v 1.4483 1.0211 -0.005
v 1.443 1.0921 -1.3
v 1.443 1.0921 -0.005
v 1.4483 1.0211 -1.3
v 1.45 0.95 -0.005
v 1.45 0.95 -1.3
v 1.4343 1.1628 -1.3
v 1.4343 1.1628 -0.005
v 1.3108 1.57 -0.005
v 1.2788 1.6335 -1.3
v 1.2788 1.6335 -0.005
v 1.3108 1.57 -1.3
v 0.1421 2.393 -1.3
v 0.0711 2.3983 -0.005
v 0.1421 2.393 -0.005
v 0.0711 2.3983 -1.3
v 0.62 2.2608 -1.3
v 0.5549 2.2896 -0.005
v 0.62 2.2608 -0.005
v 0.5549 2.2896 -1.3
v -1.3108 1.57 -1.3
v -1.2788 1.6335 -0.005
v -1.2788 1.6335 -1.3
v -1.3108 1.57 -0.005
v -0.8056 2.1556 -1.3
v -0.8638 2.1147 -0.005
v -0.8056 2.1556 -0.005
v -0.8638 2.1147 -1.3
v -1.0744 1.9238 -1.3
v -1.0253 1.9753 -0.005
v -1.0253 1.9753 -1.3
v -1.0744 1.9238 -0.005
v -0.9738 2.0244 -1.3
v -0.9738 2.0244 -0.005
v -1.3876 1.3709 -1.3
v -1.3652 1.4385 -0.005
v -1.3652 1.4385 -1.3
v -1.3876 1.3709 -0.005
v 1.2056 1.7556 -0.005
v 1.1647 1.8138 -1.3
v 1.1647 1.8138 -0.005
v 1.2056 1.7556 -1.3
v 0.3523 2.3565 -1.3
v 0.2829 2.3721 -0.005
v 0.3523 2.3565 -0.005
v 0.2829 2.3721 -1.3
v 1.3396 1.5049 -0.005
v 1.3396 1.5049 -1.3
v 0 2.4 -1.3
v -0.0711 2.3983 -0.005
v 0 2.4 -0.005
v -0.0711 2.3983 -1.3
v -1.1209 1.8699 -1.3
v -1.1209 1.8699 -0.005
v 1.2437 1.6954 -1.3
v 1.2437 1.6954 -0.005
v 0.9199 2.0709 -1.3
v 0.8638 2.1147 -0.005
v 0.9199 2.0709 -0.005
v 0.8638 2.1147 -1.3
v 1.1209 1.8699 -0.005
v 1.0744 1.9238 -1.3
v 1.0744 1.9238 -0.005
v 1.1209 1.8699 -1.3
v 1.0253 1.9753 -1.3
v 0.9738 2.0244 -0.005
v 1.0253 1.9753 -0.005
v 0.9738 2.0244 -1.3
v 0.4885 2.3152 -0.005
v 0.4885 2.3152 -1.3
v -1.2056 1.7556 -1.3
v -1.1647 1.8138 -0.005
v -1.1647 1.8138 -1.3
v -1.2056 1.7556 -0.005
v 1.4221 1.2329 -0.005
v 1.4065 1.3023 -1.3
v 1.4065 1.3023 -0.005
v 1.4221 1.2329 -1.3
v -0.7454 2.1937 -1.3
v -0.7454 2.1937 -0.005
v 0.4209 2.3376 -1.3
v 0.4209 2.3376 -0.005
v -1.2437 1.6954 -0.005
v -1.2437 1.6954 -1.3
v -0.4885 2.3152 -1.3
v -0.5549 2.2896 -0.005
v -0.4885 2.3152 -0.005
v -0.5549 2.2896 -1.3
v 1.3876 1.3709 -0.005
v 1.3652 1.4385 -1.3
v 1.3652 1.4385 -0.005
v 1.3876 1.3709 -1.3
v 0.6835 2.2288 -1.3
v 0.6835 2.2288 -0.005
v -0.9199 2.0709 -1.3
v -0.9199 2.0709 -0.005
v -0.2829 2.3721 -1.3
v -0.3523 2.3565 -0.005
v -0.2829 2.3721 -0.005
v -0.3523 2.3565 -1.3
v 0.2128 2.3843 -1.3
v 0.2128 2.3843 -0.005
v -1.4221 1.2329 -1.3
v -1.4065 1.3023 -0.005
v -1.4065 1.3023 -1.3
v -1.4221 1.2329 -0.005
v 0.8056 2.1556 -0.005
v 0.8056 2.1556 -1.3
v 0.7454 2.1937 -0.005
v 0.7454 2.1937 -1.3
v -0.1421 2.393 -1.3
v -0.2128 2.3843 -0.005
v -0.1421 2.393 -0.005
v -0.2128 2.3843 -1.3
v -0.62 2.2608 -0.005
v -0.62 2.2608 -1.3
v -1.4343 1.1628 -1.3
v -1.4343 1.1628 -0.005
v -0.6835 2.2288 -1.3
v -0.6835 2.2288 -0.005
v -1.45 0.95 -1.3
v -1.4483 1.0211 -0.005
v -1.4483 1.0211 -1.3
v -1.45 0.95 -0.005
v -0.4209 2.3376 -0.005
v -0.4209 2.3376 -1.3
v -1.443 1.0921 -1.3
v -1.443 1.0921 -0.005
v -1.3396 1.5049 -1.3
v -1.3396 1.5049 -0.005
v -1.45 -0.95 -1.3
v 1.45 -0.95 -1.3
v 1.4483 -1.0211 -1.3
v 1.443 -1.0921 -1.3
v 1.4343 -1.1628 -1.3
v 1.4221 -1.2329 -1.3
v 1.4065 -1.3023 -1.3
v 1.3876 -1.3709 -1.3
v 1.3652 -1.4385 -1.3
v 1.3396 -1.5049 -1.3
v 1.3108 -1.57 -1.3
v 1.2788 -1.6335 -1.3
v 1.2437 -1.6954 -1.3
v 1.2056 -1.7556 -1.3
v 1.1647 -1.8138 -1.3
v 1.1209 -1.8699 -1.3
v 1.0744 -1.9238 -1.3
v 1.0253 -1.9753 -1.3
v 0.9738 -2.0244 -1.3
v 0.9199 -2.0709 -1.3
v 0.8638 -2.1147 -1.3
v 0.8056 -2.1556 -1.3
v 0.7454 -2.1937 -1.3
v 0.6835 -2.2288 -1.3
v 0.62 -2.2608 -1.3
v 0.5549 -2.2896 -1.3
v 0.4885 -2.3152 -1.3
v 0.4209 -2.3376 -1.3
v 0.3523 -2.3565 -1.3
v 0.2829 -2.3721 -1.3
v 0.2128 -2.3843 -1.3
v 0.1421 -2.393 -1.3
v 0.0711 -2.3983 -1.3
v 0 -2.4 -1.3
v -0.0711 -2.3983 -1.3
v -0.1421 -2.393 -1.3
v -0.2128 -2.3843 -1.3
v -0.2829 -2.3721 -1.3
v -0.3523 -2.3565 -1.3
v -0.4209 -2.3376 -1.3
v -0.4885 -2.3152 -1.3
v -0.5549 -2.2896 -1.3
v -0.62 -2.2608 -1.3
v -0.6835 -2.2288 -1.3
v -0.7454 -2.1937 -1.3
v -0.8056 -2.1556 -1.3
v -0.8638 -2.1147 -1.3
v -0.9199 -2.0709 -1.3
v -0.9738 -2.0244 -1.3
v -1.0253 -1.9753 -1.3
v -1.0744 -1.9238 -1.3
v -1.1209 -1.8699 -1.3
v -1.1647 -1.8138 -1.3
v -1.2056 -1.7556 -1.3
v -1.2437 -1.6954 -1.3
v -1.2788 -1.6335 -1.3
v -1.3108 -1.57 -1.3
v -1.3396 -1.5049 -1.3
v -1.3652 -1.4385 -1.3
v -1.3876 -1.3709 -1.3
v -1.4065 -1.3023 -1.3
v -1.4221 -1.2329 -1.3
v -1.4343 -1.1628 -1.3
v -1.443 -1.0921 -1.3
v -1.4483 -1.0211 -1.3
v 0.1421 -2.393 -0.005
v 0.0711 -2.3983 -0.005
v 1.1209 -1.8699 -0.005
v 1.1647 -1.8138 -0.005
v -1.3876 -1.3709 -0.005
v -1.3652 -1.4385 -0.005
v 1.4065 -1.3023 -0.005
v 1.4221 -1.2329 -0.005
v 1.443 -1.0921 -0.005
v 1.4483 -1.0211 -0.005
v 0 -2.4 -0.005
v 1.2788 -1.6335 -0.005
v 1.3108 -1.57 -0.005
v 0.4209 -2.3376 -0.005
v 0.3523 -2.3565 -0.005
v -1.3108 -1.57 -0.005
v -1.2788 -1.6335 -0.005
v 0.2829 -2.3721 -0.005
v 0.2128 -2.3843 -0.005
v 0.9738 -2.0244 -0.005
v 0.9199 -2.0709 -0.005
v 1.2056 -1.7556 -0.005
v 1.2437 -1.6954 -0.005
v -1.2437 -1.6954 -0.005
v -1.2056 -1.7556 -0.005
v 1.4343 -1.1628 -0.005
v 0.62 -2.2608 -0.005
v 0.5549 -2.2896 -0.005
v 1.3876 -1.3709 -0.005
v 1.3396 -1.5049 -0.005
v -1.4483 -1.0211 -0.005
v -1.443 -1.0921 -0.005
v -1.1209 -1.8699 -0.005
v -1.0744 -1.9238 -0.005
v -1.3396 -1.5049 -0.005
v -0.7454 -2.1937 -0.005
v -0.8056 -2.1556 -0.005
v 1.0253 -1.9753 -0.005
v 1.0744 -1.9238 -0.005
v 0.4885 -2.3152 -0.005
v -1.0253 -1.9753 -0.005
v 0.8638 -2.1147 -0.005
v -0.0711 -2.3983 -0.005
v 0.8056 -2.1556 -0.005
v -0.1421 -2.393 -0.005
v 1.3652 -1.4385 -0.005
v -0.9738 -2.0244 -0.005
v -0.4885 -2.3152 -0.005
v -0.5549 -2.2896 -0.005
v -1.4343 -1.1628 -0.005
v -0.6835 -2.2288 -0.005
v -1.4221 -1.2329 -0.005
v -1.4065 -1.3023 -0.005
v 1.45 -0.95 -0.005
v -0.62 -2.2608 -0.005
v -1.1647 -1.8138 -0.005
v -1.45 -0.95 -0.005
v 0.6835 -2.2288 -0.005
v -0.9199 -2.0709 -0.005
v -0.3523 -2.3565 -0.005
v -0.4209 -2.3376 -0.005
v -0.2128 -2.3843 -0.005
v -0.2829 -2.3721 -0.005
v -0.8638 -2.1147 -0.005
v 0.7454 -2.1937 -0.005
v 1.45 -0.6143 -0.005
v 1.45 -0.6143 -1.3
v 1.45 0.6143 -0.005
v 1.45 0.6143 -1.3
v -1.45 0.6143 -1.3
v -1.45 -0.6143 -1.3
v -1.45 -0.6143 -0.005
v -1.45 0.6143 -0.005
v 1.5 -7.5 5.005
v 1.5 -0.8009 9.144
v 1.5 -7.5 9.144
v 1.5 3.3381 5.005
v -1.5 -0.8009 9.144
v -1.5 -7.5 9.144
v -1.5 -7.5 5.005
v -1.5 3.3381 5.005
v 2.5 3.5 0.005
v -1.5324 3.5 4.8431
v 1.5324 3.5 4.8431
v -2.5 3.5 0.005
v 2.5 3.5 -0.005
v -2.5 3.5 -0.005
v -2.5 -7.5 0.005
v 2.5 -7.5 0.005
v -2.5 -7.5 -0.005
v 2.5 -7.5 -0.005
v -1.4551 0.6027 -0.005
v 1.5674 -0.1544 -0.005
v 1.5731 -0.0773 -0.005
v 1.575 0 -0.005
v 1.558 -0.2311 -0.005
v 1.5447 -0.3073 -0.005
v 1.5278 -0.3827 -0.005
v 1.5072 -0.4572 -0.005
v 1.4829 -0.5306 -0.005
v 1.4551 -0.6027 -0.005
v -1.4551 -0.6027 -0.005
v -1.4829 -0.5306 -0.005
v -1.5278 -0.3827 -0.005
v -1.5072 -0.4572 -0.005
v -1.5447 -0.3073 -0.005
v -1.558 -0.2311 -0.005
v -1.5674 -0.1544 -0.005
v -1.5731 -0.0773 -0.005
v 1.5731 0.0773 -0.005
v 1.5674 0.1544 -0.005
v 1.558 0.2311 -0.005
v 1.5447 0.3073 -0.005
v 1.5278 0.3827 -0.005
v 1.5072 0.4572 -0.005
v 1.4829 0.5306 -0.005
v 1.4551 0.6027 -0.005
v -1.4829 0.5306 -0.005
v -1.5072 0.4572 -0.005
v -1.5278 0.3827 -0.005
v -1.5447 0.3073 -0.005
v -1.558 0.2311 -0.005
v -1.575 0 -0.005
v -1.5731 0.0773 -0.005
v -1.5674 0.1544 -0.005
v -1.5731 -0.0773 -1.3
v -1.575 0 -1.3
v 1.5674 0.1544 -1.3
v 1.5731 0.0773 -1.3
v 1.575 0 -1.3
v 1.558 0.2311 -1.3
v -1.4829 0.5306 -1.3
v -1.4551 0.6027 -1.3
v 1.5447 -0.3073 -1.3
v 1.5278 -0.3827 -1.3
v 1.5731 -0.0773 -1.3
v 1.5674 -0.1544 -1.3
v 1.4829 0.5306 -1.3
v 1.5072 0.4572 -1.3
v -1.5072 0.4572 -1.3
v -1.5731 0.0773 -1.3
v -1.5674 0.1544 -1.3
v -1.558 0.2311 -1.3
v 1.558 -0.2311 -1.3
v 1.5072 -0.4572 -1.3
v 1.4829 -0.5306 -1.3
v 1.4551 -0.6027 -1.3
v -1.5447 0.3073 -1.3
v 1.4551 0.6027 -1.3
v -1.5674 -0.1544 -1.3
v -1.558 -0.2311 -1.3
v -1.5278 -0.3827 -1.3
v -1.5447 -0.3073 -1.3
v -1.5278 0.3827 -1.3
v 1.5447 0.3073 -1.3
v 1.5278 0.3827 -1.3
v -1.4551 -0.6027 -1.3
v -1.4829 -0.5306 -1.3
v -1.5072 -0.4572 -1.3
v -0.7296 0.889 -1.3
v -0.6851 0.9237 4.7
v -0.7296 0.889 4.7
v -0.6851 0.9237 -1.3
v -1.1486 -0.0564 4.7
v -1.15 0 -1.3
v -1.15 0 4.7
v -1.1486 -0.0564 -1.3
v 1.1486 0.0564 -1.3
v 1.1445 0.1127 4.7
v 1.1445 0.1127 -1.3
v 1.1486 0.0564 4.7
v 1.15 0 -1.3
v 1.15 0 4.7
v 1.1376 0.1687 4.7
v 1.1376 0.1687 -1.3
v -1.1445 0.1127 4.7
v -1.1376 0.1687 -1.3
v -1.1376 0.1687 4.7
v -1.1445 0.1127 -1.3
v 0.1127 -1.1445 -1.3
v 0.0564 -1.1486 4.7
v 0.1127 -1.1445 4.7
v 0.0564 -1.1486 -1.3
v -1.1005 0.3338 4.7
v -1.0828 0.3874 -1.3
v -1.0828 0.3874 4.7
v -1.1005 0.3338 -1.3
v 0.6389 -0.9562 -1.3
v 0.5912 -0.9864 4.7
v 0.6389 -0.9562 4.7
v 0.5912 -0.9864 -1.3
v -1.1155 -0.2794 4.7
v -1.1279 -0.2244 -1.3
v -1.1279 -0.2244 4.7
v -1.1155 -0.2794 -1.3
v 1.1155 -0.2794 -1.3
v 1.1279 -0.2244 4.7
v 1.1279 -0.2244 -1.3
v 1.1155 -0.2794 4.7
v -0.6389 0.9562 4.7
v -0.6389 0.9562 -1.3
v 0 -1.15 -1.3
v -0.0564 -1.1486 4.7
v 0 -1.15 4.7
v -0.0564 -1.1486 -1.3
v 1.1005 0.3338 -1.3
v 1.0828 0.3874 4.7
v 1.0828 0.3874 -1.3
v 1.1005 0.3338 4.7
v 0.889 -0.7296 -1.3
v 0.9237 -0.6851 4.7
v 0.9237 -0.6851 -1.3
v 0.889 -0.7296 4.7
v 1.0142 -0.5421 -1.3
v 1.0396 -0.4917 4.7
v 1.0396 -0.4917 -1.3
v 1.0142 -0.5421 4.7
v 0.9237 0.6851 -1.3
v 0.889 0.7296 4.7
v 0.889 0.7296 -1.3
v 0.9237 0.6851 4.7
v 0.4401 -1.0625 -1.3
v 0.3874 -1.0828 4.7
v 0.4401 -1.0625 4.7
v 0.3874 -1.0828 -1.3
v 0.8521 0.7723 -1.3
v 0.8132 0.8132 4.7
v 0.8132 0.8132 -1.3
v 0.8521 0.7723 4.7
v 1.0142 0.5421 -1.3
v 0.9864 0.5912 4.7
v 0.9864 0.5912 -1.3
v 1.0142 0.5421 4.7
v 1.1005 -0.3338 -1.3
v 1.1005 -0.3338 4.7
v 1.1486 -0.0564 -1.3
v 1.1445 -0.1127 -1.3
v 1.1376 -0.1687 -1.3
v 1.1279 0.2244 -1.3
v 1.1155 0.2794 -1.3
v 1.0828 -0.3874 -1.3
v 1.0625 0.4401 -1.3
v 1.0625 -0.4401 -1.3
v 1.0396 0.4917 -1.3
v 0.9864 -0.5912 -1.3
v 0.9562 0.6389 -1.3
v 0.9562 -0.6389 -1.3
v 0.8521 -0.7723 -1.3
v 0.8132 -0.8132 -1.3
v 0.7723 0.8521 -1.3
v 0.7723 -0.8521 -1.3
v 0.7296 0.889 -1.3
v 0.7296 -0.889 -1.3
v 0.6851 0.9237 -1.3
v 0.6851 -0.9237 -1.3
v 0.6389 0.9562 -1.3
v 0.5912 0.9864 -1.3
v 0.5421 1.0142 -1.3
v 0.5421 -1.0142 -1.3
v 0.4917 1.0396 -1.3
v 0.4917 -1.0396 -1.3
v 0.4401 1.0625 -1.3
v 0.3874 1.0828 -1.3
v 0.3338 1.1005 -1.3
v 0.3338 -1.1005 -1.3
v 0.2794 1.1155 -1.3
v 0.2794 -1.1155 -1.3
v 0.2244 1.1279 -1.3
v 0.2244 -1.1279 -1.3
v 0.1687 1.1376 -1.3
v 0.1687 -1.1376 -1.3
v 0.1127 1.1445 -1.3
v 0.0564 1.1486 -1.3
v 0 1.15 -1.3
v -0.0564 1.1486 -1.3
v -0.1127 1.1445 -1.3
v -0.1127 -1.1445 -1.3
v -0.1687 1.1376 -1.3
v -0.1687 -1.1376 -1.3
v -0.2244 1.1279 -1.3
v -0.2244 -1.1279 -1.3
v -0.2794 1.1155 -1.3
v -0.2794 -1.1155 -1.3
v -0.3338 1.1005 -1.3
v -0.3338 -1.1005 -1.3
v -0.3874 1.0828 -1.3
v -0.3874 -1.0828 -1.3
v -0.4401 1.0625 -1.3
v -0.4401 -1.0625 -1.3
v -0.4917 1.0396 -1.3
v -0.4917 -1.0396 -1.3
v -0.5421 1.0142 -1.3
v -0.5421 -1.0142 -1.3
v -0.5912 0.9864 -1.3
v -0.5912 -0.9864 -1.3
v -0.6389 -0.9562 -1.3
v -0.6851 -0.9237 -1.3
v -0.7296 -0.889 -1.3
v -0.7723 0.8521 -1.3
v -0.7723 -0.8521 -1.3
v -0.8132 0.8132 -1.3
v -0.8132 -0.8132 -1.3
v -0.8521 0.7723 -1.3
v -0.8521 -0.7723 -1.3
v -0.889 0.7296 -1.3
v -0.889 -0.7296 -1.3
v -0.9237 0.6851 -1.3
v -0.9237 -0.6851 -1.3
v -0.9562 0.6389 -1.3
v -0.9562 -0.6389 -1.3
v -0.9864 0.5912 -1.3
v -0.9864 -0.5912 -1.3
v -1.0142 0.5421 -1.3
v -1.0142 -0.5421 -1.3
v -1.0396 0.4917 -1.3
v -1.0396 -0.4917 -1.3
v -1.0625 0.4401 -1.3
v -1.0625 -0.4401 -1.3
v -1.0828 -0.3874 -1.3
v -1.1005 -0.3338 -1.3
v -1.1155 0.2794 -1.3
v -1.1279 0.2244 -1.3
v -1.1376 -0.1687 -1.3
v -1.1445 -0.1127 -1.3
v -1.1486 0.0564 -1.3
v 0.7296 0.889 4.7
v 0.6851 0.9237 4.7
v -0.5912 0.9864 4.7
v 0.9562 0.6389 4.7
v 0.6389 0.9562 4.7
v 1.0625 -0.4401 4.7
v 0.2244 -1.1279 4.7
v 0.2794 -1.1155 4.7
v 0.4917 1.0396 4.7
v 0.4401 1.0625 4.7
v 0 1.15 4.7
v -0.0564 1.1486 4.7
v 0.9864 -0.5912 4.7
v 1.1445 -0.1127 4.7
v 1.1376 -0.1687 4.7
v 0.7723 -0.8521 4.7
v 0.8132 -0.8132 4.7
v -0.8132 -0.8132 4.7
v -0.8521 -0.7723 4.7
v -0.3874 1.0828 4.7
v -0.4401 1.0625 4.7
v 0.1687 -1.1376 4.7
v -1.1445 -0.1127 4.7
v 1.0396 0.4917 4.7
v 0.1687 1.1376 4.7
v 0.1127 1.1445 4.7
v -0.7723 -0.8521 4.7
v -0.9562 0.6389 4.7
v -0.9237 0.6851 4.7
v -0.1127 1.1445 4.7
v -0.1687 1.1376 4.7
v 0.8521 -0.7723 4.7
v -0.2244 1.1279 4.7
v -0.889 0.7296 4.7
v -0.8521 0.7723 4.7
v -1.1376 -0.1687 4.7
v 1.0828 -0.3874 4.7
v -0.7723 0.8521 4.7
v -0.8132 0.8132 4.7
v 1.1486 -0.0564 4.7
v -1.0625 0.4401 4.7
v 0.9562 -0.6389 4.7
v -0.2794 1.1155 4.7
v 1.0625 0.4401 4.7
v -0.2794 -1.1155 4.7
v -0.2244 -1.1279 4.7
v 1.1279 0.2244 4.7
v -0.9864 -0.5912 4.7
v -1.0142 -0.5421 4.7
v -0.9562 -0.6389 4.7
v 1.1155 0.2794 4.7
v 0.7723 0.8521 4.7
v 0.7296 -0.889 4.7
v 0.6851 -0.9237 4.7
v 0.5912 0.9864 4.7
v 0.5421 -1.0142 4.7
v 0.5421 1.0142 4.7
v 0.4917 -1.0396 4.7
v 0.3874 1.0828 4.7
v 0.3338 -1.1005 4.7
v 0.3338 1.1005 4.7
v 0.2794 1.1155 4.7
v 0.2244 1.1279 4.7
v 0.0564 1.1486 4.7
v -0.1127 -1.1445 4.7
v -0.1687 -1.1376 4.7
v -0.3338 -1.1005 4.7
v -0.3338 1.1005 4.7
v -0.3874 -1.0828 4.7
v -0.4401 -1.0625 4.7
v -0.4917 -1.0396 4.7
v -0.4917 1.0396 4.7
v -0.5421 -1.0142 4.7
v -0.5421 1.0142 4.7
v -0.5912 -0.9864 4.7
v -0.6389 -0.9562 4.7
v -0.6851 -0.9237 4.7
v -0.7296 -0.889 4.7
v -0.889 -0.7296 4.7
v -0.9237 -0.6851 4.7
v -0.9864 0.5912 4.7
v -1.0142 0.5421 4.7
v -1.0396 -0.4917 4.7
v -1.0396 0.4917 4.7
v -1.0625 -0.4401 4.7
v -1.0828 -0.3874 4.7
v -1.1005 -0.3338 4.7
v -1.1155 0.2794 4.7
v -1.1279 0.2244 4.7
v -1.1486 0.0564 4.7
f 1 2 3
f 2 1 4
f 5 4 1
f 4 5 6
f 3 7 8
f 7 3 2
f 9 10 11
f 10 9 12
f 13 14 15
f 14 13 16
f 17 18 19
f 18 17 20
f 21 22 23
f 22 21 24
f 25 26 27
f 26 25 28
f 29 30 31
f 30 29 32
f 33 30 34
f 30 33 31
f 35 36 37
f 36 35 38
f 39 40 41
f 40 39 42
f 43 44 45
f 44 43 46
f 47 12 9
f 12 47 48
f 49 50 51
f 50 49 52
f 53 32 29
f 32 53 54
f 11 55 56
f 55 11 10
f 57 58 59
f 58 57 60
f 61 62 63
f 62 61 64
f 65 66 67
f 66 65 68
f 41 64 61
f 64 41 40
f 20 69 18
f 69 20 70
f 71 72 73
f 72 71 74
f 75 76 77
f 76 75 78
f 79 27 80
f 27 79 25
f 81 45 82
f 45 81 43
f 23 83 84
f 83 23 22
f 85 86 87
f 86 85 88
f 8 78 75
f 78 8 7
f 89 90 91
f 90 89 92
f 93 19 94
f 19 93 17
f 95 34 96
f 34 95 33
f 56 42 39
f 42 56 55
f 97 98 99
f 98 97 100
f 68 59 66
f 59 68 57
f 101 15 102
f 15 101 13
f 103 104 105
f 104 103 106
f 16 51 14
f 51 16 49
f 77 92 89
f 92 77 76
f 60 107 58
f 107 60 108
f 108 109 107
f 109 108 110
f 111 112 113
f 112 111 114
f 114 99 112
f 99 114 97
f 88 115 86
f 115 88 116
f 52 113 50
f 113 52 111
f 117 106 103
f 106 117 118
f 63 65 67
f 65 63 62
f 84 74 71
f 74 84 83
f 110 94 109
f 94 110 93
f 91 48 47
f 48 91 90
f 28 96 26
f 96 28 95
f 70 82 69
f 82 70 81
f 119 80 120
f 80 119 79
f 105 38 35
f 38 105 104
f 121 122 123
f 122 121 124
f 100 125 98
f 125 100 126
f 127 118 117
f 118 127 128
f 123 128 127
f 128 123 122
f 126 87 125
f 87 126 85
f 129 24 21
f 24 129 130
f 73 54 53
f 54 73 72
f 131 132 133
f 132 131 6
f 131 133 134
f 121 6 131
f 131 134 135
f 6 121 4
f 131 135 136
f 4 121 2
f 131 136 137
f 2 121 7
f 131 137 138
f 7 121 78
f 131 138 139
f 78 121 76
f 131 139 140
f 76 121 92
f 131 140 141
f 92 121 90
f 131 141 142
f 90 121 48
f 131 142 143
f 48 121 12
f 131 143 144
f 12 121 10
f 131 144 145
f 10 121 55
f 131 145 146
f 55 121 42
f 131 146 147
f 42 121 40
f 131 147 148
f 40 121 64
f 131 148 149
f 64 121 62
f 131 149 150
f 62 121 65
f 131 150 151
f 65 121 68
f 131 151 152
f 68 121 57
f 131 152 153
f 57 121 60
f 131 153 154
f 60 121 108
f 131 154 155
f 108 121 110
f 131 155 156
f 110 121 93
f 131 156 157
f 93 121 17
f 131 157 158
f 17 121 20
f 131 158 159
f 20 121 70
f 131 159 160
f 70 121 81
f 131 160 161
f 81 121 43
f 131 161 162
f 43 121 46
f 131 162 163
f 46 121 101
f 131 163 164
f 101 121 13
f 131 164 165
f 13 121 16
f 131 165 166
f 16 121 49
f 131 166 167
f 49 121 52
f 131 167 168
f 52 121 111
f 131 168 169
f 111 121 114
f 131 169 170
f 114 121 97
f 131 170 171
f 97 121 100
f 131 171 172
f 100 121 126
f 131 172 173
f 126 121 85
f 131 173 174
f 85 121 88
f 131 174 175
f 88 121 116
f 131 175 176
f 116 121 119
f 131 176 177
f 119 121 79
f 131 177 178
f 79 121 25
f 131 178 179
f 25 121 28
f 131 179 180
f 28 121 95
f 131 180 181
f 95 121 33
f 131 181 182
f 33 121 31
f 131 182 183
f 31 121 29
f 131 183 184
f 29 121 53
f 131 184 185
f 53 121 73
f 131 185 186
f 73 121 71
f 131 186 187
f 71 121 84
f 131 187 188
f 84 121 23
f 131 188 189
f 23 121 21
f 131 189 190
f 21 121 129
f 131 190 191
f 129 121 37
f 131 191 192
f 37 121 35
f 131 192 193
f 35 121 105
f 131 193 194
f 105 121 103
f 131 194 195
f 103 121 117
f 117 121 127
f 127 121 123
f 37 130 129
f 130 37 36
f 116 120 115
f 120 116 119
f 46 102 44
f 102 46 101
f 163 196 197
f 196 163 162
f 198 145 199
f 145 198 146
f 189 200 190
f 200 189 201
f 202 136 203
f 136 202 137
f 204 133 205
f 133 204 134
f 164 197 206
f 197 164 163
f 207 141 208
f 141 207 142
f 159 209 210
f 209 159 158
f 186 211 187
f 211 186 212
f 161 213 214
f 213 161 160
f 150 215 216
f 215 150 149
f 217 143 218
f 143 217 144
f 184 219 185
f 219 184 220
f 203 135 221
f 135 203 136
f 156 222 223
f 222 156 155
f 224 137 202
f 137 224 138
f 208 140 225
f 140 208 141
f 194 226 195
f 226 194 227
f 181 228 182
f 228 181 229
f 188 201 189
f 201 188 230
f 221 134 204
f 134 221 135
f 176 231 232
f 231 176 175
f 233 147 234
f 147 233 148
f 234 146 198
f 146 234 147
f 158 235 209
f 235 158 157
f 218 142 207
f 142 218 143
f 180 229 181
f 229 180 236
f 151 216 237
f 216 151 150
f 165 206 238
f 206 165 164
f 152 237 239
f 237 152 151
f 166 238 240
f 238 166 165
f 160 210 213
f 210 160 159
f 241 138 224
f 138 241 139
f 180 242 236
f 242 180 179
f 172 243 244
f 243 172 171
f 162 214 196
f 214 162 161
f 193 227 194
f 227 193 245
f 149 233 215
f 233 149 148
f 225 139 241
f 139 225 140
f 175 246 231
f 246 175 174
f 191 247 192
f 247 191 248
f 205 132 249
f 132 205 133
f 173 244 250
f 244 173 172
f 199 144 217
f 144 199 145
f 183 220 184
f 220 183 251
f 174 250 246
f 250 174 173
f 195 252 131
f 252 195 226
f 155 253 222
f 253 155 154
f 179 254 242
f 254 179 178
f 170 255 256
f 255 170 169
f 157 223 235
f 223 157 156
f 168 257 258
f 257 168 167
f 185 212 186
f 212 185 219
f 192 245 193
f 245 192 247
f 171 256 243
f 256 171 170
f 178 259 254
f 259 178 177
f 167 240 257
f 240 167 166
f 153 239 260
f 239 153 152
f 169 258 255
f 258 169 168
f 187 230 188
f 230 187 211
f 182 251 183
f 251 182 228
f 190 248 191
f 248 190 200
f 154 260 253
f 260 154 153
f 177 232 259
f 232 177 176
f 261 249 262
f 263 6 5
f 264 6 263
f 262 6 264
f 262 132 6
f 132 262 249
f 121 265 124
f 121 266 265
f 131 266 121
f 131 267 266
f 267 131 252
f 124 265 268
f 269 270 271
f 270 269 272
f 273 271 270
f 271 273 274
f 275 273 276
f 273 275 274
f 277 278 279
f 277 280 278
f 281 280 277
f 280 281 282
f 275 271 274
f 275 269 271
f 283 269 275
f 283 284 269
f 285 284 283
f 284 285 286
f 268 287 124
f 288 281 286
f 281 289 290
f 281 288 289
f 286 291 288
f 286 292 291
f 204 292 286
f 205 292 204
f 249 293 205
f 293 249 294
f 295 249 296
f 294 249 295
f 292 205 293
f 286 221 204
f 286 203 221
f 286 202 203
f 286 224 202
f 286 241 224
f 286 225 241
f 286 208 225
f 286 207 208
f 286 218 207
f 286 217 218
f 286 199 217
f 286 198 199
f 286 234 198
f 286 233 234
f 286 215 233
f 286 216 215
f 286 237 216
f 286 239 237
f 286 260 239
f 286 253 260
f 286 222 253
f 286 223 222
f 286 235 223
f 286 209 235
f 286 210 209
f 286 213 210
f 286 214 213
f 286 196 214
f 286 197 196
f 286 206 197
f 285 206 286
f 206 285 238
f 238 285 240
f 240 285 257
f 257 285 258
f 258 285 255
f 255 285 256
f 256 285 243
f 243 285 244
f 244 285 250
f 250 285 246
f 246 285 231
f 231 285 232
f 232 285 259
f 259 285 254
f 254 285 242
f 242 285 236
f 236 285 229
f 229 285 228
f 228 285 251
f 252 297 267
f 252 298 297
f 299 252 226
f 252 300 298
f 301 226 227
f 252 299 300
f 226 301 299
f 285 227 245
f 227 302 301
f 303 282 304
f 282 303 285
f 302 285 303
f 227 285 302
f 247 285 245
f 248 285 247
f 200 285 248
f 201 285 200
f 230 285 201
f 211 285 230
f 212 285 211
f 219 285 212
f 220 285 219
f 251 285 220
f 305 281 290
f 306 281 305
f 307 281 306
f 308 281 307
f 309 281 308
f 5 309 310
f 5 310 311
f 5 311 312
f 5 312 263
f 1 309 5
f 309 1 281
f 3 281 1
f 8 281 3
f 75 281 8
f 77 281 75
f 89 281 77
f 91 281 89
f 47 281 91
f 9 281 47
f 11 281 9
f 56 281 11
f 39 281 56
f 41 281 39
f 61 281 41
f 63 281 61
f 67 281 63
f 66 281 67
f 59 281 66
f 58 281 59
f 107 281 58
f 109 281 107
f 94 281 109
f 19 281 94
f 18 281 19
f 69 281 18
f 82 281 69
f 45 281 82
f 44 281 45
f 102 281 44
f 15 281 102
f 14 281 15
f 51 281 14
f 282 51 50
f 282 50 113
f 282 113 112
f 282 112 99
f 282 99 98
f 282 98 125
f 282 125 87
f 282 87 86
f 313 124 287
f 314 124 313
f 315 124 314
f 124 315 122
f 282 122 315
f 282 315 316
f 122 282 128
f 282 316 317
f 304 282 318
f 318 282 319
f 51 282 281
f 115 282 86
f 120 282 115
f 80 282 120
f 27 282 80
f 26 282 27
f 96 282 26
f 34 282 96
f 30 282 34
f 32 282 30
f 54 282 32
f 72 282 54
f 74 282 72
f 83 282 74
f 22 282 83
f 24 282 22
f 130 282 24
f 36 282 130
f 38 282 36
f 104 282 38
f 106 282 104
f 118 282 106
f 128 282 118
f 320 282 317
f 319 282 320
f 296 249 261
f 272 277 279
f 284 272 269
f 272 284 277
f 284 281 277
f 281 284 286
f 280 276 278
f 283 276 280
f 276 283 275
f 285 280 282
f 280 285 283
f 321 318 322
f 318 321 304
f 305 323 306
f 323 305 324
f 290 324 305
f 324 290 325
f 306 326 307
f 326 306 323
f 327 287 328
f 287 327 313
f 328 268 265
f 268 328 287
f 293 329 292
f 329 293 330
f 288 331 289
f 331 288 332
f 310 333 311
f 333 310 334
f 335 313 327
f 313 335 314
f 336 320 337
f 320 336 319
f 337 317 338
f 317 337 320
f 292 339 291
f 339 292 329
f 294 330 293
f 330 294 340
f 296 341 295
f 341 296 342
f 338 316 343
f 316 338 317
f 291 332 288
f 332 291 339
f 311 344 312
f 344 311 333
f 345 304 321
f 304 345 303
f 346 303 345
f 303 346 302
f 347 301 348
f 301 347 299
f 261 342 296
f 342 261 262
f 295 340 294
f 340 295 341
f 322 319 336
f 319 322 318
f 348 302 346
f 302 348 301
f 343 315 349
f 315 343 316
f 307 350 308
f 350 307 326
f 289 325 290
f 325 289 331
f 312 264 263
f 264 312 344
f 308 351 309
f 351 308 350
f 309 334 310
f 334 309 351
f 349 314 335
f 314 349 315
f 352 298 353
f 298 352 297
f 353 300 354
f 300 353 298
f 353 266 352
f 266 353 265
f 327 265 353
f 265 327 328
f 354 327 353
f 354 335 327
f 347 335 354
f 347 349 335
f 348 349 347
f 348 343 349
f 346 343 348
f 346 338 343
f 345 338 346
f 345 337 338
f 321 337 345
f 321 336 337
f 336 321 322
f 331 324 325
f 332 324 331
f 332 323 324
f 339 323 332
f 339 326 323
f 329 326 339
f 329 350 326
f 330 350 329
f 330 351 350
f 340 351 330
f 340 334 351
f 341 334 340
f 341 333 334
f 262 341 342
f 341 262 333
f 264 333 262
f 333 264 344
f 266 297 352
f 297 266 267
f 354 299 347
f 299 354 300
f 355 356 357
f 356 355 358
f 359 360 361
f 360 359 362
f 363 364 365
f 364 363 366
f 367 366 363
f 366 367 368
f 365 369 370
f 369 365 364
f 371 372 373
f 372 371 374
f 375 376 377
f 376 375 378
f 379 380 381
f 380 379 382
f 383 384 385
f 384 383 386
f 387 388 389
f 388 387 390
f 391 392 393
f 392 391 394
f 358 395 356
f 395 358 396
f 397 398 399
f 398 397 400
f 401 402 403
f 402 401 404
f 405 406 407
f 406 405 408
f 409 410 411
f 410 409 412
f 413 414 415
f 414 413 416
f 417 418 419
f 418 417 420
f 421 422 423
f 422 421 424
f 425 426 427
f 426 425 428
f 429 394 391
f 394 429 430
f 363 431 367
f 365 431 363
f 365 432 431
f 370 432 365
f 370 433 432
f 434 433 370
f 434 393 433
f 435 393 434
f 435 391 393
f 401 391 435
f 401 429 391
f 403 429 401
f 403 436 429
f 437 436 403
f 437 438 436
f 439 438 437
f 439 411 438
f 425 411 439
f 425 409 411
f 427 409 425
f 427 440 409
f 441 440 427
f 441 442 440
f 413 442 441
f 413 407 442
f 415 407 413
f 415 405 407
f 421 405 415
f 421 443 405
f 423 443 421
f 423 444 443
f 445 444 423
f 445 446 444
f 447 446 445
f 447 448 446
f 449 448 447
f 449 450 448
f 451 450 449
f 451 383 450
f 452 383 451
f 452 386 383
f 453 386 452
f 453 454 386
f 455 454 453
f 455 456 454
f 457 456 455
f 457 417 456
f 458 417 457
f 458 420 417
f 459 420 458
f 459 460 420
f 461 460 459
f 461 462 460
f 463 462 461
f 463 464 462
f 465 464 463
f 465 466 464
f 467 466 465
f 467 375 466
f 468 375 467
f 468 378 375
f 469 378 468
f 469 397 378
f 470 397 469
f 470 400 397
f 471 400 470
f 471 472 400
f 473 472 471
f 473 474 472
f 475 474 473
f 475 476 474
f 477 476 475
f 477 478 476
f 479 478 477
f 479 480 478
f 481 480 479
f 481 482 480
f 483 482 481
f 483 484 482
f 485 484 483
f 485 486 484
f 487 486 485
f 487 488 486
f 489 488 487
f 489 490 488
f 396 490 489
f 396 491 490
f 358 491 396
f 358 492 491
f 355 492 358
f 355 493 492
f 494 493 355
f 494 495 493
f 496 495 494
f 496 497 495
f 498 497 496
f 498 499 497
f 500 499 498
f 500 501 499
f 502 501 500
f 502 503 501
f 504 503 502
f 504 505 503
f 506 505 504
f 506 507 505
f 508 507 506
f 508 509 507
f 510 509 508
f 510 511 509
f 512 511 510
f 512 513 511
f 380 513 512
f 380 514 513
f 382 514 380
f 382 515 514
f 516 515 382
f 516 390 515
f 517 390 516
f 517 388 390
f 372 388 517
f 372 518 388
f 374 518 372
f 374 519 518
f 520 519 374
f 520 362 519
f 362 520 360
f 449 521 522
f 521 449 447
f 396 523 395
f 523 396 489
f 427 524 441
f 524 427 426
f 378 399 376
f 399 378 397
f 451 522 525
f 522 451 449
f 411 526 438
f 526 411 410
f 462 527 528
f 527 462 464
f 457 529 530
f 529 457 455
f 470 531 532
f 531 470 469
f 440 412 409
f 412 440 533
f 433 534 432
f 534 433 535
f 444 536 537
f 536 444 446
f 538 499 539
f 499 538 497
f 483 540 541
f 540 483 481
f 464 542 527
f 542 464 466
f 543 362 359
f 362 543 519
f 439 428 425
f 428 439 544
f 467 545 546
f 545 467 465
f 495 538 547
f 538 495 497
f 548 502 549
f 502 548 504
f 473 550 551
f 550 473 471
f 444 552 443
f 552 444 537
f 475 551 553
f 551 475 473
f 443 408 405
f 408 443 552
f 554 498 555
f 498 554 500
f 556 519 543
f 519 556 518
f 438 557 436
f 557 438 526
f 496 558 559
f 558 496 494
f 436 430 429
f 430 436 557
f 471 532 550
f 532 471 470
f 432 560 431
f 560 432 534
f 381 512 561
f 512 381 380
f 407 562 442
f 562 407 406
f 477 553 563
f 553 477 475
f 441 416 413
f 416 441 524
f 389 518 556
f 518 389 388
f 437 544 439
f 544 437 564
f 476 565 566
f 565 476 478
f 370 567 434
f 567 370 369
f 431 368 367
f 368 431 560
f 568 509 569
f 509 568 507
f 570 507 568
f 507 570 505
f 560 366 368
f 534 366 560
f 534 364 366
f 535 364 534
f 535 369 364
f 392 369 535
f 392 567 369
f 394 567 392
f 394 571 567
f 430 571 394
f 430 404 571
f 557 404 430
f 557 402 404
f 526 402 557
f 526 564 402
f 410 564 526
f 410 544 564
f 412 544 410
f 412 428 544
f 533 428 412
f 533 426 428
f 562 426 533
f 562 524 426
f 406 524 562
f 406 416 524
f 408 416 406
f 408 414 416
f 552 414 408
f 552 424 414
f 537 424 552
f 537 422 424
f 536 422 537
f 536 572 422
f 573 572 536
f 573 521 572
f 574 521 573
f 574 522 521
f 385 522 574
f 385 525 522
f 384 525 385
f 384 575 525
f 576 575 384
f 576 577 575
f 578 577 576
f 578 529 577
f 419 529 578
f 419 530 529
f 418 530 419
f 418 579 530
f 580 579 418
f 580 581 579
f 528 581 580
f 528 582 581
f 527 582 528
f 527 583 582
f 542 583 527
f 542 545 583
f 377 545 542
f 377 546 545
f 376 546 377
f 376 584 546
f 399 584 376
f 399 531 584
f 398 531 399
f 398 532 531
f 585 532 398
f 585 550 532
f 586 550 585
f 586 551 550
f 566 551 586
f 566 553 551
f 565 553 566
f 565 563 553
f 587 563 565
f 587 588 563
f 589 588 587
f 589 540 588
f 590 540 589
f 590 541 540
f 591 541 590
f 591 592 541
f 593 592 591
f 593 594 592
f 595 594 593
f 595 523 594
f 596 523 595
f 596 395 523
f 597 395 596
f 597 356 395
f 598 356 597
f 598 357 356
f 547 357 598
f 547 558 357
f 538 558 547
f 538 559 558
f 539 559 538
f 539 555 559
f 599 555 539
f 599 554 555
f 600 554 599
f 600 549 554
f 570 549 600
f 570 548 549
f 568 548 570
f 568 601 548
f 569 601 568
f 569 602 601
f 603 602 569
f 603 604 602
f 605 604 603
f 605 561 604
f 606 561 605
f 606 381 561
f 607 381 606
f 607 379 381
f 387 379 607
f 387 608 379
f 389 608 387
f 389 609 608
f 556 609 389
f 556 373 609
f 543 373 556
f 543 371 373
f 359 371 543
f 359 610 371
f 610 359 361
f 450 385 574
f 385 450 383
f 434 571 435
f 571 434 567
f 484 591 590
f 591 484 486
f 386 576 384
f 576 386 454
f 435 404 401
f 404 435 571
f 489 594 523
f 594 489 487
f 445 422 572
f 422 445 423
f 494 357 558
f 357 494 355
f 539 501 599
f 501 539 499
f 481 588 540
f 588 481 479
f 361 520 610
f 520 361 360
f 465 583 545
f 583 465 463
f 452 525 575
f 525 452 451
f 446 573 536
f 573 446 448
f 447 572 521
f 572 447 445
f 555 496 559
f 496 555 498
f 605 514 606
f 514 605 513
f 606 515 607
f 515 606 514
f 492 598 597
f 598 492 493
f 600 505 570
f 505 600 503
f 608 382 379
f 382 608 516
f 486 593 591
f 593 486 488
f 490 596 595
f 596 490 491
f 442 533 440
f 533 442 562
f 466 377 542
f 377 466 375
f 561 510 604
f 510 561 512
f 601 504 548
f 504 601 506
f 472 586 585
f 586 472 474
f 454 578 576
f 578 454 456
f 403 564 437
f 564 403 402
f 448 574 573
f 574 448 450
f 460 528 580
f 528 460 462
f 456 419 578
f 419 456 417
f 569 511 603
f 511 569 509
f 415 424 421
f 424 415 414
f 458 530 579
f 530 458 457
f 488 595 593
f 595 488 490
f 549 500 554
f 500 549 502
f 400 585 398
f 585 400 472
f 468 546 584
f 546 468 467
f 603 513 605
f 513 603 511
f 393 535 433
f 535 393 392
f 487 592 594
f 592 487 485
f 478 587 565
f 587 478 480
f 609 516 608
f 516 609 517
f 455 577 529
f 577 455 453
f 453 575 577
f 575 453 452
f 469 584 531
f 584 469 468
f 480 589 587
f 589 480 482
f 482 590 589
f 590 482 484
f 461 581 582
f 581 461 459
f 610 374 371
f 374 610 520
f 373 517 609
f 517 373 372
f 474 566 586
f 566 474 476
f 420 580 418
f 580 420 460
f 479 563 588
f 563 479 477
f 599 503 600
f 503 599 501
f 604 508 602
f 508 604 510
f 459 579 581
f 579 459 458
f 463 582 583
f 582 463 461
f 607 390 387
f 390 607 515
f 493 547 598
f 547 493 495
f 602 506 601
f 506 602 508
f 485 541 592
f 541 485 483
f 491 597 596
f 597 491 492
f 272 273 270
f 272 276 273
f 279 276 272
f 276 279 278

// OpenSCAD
// file: ../util/rounded_cube.scad
module rounded_cube(x, y, z, radius) {
	union() {
		translate([x / 2 - radius, y / 2 - radius, 0]) cylinder(z, radius, radius, center = true);
		translate([-x / 2 + radius, y / 2 - radius, 0]) cylinder(z, radius, radius, center = true);
		translate([x / 2 - radius, -y / 2 + radius, 0]) cylinder(z, radius, radius, center = true);
		translate([-x / 2 + radius, -y / 2 + radius, 0]) cylinder(z, radius, radius, center = true);
		cube([x, y - 2 * radius, z], center = true);
		cube([x - 2 * radius, y, z], center = true);
	}
}

module fully_rounded_cube(x, y, z, radius) {
	union() {
		translate([x / 2 - radius, y / 2 - radius, 0]) cylinder(z - 2 * radius, radius, radius, center = true);
		translate([-x / 2 + radius, y / 2 - radius, 0]) cylinder(z - 2 * radius, radius, radius, center = true);
		translate([x / 2 - radius, -y / 2 + radius, 0]) cylinder(z - 2 * radius, radius, radius, center = true);
		translate([-x / 2 + radius, -y / 2 + radius, 0]) cylinder(z - 2 * radius, radius, radius, center = true);
		translate([x / 2 - radius, 0, z / 2 - radius]) rotate([90, 0, 0]) cylinder(y - 2 * radius, radius,
		radius, center = true);
		translate([-x / 2 + radius, 0, z / 2 - radius]) rotate([90, 0, 0]) cylinder(y - 2 * radius, radius,
		radius, center = true);
		translate([0, -y / 2 + radius, z / 2 - radius]) rotate([0, 90, 0]) cylinder(x - 2 * radius, radius,
		radius, center = true);
		translate([0, y / 2 - radius, z / 2 - radius]) rotate([0, 90, 0]) cylinder(x - 2 * radius, radius, radius,
		center = true);
		translate([x / 2 - radius, 0, -z / 2 + radius]) rotate([90, 0, 0]) cylinder(y - 2 * radius, radius,
		radius, center = true);
		translate([-x / 2 + radius, 0, -z / 2 + radius]) rotate([90, 0, 0]) cylinder(y - 2 * radius, radius,
		radius, center = true);
		translate([0, -y / 2 + radius, -z / 2 + radius]) rotate([0, 90, 0]) cylinder(x - 2 * radius, radius,
		radius, center = true);
		translate([0, y / 2 - radius, -z / 2 + radius]) rotate([0, 90, 0]) cylinder(x - 2 * radius, radius, radius,
		center = true);
		translate([x / 2 - radius, y / 2 - radius, z / 2 - radius]) sphere(radius);
		translate([-x / 2 + radius, y / 2 - radius, z / 2 - radius]) sphere(radius);
		translate([x / 2 - radius, -y / 2 + radius, z / 2 - radius]) sphere(radius);
		translate([-x / 2 + radius, -y / 2 + radius, z / 2 - radius]) sphere(radius);
		translate([x / 2 - radius, y / 2 - radius, -z / 2 + radius]) sphere(radius);
		translate([-x / 2 + radius, y / 2 - radius, -z / 2 + radius]) sphere(radius);
		translate([x / 2 - radius, -y / 2 + radius, -z / 2 + radius]) sphere(radius);
		translate([-x / 2 + radius, -y / 2 + radius, -z / 2 + radius]) sphere(radius);
		cube([x, y - 2 * radius, z - 2 * radius], center = true);
		cube([x - 2 * radius, y, z - 2 * radius], center = true);
		cube([x - 2 * radius, y - 2 * radius, z], center = true);
	}
}

module mlok_slot() {
	rounded_cube(7, 32, 4, 2);
}

module mlok_bulge_solid() {
	rounded_cube(11.8, 6.8, 2, 3);
}

module mlok_bulge_with_hole() {
	difference() {
		mlok_bulge_solid();
		cube([8, 8, 2], center = true);
	}
}
// main file
include <../util/rounded_cube.scad>

$fn = 128;

difference() {
	union() {
		//main body
		translate([0, -2, 9.144 / 2]) cube([3, 11, 9.144], center = true);
		//slope on the side
		hull() {
			translate([0, -2, 0]) cube([5, 11, 0.01], center = true);
			translate([0, -2, 5]) cube([3, 11, 0.01], center = true);
		}
		//slide footprint
		translate([0, 0, -1.3 / 2]) rounded_cube(2.9, 4.8, 1.3, 1.45);
		translate([0, 0, -1.3]) cylinder(1.3, 3.15 / 2, 3.15 / 2);
	}
	//screw hole
	translate([0, 0, -1.3]) cylinder(6, 1.15, 1.15);
	//angle in the front
	translate([0, 4, 10]) rotate([45, 0, 0]) cube(8, center = true);
}
